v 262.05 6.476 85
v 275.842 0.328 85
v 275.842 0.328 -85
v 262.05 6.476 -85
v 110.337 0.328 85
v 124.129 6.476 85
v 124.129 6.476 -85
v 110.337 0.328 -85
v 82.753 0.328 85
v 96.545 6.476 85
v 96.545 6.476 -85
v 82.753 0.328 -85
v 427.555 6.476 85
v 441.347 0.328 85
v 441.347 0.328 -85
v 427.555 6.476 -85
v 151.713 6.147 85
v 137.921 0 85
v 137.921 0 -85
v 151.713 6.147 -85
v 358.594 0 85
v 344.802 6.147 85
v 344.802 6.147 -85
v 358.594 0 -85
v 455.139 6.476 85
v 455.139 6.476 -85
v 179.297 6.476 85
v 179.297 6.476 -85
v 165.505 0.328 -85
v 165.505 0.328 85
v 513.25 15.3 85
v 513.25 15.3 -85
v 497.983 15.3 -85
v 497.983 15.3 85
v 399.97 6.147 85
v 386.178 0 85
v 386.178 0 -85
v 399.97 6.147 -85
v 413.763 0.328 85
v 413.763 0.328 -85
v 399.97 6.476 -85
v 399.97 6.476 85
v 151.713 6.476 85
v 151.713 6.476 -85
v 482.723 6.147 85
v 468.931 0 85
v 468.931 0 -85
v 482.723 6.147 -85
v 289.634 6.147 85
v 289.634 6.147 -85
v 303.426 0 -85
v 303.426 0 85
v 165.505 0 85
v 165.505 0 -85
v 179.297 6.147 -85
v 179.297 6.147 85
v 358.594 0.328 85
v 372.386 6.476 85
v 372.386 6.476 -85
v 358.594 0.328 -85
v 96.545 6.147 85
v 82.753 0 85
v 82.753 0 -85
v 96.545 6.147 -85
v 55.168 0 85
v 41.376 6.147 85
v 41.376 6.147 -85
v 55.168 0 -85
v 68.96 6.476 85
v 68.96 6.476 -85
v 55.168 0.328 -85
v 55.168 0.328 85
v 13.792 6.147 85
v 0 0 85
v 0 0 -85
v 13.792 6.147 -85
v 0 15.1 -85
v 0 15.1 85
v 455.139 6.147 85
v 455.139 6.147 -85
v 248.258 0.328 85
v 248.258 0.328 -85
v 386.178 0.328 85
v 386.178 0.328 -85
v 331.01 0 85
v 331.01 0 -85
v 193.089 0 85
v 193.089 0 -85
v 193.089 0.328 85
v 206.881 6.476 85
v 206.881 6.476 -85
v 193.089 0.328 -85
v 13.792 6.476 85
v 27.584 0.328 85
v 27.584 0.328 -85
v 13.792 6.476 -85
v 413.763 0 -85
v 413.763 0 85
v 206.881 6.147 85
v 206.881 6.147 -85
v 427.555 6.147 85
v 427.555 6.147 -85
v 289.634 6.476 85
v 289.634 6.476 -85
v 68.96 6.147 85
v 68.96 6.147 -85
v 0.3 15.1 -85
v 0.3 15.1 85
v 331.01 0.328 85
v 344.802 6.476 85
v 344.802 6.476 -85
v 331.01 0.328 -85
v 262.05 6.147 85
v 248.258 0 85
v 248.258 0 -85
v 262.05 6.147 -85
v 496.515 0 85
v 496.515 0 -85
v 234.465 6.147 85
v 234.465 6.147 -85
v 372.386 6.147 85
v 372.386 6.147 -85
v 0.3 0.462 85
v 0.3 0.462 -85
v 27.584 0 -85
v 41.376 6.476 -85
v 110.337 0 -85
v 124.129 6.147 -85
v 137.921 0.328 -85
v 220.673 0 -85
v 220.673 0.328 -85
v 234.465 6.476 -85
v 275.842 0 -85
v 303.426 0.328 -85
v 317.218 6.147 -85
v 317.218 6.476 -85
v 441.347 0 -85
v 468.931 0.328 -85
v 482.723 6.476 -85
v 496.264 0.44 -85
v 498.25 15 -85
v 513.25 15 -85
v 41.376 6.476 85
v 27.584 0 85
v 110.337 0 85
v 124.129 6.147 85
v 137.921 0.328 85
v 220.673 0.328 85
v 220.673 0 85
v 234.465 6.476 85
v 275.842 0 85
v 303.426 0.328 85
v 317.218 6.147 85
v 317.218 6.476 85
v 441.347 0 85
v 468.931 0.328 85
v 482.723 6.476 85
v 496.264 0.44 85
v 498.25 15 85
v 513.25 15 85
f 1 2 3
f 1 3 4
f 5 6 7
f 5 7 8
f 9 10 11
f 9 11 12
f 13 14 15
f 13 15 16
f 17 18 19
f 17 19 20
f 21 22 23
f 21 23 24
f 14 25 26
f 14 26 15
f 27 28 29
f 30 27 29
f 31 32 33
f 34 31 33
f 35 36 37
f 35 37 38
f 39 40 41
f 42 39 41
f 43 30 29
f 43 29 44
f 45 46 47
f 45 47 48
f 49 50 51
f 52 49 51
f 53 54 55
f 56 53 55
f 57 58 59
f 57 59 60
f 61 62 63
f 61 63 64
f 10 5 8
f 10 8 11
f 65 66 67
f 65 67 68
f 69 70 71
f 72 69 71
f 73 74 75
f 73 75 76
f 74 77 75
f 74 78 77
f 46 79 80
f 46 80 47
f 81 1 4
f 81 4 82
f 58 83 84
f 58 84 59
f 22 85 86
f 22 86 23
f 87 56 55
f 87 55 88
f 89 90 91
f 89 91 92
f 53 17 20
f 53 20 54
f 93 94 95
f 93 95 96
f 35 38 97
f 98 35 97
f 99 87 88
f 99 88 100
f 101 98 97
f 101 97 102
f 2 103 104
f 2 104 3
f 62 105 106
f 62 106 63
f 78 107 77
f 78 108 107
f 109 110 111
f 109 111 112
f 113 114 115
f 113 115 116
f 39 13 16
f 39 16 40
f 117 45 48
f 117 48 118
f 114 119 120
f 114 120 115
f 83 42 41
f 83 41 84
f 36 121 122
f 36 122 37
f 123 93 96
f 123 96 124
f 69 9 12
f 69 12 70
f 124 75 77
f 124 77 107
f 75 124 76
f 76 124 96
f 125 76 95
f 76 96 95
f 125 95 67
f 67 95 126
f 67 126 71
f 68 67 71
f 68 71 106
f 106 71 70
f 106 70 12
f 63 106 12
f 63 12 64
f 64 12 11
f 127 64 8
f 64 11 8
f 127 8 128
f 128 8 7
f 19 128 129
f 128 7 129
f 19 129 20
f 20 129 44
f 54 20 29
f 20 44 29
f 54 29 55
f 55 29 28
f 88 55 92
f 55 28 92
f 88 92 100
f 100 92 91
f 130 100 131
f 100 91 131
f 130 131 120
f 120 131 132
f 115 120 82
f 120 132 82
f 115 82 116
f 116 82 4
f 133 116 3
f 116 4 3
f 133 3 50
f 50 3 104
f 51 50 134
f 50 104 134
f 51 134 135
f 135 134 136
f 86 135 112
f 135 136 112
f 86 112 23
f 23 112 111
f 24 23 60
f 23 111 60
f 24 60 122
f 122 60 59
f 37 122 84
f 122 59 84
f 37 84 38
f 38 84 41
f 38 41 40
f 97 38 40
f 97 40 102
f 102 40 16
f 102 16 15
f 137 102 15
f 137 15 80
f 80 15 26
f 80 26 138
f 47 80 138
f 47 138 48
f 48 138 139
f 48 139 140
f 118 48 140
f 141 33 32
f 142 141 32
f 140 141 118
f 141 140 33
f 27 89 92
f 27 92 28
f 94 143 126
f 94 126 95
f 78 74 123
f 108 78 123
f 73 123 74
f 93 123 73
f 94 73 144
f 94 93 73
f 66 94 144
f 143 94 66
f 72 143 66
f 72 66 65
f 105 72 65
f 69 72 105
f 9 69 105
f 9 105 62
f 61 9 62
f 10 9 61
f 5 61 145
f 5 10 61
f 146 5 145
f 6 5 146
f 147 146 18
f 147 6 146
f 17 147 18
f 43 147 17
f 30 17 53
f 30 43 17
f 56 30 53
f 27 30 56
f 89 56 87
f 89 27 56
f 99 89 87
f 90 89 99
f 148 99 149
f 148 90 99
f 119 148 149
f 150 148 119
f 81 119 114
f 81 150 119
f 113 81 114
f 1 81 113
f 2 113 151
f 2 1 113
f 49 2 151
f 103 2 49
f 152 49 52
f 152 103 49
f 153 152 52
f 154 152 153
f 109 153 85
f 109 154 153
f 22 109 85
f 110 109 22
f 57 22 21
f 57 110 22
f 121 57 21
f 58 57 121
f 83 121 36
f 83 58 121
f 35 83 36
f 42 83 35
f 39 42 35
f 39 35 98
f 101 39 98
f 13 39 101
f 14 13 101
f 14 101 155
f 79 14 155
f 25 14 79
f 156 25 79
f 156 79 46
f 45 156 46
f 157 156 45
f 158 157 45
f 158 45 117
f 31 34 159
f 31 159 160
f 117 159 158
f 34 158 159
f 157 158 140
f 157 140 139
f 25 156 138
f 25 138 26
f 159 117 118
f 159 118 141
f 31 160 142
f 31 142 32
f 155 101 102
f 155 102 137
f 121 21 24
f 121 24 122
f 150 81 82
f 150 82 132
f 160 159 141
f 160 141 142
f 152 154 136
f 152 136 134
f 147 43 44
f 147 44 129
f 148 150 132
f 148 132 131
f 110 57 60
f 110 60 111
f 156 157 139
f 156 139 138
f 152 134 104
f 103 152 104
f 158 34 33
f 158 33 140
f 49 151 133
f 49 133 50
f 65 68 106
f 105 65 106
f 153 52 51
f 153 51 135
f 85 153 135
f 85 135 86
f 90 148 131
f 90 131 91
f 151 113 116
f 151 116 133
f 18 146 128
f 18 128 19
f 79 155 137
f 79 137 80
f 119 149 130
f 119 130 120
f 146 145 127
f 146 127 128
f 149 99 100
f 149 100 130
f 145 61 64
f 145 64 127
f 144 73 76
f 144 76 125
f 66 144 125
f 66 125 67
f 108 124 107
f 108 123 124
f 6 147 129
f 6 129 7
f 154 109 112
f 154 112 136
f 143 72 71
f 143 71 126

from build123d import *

# Parameters (mm, degrees)
EXTRUDE_THIN1_DEPTH = 85


with BuildPart() as part:
    # Sketch1 → Extrude-Thin1 (new, symmetric)
    with BuildSketch(Plane.XY):
        Polygon((0, 15.1), (0, 0), (13.79208513, 6.147226022), (27.58417026, 0), (41.37625539, 6.147226022), (55.16834052, 0), (68.960425651, 6.147226022), (82.752510781, 0), (96.544595911, 6.147226022), (110.336681041, 0), (124.128766171, 6.147226022), (137.920851301, 0), (151.712936431, 6.147226022), (165.505021561, 0), (179.297106692, 6.147226022), (193.089191822, 0), (206.881276952, 6.147226022), (220.673362082, 0), (234.465447212, 6.147226022), (248.257532342, 0), (262.049617472, 6.147226022), (275.841702602, 0), (289.633787732, 6.147226022), (303.425872863, 0), (317.217957993, 6.147226022), (331.010043123, 0), (344.802128253, 6.147226022), (358.594213383, 0), (372.386298513, 6.147226022), (386.178383643, 0), (399.970468773, 6.147226022), (413.762553904, 0), (427.554639034, 6.147226022), (441.346724164, 0), (455.138809294, 6.147226022), (468.930894424, 0), (482.722979554, 6.147226022), (496.515064684, 0), (498.249999842, 15), (513.249999842, 15), (513.249999842, 15.3), (497.982698545, 15.3), (496.263996817, 0.440351902), (482.722979554, 6.475675271), (468.930894424, 0.328449249), (455.138809294, 6.475675271), (441.346724164, 0.328449249), (427.554639034, 6.475675271), (413.762553904, 0.328449249), (399.970468773, 6.475675271), (386.178383643, 0.328449249), (372.386298513, 6.475675271), (358.594213383, 0.328449249), (344.802128253, 6.475675271), (331.010043123, 0.328449249), (317.217957993, 6.475675271), (303.425872863, 0.328449249), (289.633787732, 6.475675271), (275.841702602, 0.328449249), (262.049617472, 6.475675271), (248.257532342, 0.328449249), (234.465447212, 6.475675271), (220.673362082, 0.328449249), (206.881276952, 6.475675271), (193.089191822, 0.328449249), (179.297106692, 6.475675271), (165.505021561, 0.328449249), (151.712936431, 6.475675271), (137.920851301, 0.328449249), (124.128766171, 6.475675271), (110.336681041, 0.328449249), (96.544595911, 6.475675271), (82.752510781, 0.328449249), (68.960425651, 6.475675271), (55.16834052, 0.328449249), (41.37625539, 6.475675271), (27.58417026, 0.328449249), (13.79208513, 6.475675271), (0.3, 0.462161286), (0.3, 15.1), align=None)
    extrude(amount=EXTRUDE_THIN1_DEPTH, both=True)


solid = part.part
